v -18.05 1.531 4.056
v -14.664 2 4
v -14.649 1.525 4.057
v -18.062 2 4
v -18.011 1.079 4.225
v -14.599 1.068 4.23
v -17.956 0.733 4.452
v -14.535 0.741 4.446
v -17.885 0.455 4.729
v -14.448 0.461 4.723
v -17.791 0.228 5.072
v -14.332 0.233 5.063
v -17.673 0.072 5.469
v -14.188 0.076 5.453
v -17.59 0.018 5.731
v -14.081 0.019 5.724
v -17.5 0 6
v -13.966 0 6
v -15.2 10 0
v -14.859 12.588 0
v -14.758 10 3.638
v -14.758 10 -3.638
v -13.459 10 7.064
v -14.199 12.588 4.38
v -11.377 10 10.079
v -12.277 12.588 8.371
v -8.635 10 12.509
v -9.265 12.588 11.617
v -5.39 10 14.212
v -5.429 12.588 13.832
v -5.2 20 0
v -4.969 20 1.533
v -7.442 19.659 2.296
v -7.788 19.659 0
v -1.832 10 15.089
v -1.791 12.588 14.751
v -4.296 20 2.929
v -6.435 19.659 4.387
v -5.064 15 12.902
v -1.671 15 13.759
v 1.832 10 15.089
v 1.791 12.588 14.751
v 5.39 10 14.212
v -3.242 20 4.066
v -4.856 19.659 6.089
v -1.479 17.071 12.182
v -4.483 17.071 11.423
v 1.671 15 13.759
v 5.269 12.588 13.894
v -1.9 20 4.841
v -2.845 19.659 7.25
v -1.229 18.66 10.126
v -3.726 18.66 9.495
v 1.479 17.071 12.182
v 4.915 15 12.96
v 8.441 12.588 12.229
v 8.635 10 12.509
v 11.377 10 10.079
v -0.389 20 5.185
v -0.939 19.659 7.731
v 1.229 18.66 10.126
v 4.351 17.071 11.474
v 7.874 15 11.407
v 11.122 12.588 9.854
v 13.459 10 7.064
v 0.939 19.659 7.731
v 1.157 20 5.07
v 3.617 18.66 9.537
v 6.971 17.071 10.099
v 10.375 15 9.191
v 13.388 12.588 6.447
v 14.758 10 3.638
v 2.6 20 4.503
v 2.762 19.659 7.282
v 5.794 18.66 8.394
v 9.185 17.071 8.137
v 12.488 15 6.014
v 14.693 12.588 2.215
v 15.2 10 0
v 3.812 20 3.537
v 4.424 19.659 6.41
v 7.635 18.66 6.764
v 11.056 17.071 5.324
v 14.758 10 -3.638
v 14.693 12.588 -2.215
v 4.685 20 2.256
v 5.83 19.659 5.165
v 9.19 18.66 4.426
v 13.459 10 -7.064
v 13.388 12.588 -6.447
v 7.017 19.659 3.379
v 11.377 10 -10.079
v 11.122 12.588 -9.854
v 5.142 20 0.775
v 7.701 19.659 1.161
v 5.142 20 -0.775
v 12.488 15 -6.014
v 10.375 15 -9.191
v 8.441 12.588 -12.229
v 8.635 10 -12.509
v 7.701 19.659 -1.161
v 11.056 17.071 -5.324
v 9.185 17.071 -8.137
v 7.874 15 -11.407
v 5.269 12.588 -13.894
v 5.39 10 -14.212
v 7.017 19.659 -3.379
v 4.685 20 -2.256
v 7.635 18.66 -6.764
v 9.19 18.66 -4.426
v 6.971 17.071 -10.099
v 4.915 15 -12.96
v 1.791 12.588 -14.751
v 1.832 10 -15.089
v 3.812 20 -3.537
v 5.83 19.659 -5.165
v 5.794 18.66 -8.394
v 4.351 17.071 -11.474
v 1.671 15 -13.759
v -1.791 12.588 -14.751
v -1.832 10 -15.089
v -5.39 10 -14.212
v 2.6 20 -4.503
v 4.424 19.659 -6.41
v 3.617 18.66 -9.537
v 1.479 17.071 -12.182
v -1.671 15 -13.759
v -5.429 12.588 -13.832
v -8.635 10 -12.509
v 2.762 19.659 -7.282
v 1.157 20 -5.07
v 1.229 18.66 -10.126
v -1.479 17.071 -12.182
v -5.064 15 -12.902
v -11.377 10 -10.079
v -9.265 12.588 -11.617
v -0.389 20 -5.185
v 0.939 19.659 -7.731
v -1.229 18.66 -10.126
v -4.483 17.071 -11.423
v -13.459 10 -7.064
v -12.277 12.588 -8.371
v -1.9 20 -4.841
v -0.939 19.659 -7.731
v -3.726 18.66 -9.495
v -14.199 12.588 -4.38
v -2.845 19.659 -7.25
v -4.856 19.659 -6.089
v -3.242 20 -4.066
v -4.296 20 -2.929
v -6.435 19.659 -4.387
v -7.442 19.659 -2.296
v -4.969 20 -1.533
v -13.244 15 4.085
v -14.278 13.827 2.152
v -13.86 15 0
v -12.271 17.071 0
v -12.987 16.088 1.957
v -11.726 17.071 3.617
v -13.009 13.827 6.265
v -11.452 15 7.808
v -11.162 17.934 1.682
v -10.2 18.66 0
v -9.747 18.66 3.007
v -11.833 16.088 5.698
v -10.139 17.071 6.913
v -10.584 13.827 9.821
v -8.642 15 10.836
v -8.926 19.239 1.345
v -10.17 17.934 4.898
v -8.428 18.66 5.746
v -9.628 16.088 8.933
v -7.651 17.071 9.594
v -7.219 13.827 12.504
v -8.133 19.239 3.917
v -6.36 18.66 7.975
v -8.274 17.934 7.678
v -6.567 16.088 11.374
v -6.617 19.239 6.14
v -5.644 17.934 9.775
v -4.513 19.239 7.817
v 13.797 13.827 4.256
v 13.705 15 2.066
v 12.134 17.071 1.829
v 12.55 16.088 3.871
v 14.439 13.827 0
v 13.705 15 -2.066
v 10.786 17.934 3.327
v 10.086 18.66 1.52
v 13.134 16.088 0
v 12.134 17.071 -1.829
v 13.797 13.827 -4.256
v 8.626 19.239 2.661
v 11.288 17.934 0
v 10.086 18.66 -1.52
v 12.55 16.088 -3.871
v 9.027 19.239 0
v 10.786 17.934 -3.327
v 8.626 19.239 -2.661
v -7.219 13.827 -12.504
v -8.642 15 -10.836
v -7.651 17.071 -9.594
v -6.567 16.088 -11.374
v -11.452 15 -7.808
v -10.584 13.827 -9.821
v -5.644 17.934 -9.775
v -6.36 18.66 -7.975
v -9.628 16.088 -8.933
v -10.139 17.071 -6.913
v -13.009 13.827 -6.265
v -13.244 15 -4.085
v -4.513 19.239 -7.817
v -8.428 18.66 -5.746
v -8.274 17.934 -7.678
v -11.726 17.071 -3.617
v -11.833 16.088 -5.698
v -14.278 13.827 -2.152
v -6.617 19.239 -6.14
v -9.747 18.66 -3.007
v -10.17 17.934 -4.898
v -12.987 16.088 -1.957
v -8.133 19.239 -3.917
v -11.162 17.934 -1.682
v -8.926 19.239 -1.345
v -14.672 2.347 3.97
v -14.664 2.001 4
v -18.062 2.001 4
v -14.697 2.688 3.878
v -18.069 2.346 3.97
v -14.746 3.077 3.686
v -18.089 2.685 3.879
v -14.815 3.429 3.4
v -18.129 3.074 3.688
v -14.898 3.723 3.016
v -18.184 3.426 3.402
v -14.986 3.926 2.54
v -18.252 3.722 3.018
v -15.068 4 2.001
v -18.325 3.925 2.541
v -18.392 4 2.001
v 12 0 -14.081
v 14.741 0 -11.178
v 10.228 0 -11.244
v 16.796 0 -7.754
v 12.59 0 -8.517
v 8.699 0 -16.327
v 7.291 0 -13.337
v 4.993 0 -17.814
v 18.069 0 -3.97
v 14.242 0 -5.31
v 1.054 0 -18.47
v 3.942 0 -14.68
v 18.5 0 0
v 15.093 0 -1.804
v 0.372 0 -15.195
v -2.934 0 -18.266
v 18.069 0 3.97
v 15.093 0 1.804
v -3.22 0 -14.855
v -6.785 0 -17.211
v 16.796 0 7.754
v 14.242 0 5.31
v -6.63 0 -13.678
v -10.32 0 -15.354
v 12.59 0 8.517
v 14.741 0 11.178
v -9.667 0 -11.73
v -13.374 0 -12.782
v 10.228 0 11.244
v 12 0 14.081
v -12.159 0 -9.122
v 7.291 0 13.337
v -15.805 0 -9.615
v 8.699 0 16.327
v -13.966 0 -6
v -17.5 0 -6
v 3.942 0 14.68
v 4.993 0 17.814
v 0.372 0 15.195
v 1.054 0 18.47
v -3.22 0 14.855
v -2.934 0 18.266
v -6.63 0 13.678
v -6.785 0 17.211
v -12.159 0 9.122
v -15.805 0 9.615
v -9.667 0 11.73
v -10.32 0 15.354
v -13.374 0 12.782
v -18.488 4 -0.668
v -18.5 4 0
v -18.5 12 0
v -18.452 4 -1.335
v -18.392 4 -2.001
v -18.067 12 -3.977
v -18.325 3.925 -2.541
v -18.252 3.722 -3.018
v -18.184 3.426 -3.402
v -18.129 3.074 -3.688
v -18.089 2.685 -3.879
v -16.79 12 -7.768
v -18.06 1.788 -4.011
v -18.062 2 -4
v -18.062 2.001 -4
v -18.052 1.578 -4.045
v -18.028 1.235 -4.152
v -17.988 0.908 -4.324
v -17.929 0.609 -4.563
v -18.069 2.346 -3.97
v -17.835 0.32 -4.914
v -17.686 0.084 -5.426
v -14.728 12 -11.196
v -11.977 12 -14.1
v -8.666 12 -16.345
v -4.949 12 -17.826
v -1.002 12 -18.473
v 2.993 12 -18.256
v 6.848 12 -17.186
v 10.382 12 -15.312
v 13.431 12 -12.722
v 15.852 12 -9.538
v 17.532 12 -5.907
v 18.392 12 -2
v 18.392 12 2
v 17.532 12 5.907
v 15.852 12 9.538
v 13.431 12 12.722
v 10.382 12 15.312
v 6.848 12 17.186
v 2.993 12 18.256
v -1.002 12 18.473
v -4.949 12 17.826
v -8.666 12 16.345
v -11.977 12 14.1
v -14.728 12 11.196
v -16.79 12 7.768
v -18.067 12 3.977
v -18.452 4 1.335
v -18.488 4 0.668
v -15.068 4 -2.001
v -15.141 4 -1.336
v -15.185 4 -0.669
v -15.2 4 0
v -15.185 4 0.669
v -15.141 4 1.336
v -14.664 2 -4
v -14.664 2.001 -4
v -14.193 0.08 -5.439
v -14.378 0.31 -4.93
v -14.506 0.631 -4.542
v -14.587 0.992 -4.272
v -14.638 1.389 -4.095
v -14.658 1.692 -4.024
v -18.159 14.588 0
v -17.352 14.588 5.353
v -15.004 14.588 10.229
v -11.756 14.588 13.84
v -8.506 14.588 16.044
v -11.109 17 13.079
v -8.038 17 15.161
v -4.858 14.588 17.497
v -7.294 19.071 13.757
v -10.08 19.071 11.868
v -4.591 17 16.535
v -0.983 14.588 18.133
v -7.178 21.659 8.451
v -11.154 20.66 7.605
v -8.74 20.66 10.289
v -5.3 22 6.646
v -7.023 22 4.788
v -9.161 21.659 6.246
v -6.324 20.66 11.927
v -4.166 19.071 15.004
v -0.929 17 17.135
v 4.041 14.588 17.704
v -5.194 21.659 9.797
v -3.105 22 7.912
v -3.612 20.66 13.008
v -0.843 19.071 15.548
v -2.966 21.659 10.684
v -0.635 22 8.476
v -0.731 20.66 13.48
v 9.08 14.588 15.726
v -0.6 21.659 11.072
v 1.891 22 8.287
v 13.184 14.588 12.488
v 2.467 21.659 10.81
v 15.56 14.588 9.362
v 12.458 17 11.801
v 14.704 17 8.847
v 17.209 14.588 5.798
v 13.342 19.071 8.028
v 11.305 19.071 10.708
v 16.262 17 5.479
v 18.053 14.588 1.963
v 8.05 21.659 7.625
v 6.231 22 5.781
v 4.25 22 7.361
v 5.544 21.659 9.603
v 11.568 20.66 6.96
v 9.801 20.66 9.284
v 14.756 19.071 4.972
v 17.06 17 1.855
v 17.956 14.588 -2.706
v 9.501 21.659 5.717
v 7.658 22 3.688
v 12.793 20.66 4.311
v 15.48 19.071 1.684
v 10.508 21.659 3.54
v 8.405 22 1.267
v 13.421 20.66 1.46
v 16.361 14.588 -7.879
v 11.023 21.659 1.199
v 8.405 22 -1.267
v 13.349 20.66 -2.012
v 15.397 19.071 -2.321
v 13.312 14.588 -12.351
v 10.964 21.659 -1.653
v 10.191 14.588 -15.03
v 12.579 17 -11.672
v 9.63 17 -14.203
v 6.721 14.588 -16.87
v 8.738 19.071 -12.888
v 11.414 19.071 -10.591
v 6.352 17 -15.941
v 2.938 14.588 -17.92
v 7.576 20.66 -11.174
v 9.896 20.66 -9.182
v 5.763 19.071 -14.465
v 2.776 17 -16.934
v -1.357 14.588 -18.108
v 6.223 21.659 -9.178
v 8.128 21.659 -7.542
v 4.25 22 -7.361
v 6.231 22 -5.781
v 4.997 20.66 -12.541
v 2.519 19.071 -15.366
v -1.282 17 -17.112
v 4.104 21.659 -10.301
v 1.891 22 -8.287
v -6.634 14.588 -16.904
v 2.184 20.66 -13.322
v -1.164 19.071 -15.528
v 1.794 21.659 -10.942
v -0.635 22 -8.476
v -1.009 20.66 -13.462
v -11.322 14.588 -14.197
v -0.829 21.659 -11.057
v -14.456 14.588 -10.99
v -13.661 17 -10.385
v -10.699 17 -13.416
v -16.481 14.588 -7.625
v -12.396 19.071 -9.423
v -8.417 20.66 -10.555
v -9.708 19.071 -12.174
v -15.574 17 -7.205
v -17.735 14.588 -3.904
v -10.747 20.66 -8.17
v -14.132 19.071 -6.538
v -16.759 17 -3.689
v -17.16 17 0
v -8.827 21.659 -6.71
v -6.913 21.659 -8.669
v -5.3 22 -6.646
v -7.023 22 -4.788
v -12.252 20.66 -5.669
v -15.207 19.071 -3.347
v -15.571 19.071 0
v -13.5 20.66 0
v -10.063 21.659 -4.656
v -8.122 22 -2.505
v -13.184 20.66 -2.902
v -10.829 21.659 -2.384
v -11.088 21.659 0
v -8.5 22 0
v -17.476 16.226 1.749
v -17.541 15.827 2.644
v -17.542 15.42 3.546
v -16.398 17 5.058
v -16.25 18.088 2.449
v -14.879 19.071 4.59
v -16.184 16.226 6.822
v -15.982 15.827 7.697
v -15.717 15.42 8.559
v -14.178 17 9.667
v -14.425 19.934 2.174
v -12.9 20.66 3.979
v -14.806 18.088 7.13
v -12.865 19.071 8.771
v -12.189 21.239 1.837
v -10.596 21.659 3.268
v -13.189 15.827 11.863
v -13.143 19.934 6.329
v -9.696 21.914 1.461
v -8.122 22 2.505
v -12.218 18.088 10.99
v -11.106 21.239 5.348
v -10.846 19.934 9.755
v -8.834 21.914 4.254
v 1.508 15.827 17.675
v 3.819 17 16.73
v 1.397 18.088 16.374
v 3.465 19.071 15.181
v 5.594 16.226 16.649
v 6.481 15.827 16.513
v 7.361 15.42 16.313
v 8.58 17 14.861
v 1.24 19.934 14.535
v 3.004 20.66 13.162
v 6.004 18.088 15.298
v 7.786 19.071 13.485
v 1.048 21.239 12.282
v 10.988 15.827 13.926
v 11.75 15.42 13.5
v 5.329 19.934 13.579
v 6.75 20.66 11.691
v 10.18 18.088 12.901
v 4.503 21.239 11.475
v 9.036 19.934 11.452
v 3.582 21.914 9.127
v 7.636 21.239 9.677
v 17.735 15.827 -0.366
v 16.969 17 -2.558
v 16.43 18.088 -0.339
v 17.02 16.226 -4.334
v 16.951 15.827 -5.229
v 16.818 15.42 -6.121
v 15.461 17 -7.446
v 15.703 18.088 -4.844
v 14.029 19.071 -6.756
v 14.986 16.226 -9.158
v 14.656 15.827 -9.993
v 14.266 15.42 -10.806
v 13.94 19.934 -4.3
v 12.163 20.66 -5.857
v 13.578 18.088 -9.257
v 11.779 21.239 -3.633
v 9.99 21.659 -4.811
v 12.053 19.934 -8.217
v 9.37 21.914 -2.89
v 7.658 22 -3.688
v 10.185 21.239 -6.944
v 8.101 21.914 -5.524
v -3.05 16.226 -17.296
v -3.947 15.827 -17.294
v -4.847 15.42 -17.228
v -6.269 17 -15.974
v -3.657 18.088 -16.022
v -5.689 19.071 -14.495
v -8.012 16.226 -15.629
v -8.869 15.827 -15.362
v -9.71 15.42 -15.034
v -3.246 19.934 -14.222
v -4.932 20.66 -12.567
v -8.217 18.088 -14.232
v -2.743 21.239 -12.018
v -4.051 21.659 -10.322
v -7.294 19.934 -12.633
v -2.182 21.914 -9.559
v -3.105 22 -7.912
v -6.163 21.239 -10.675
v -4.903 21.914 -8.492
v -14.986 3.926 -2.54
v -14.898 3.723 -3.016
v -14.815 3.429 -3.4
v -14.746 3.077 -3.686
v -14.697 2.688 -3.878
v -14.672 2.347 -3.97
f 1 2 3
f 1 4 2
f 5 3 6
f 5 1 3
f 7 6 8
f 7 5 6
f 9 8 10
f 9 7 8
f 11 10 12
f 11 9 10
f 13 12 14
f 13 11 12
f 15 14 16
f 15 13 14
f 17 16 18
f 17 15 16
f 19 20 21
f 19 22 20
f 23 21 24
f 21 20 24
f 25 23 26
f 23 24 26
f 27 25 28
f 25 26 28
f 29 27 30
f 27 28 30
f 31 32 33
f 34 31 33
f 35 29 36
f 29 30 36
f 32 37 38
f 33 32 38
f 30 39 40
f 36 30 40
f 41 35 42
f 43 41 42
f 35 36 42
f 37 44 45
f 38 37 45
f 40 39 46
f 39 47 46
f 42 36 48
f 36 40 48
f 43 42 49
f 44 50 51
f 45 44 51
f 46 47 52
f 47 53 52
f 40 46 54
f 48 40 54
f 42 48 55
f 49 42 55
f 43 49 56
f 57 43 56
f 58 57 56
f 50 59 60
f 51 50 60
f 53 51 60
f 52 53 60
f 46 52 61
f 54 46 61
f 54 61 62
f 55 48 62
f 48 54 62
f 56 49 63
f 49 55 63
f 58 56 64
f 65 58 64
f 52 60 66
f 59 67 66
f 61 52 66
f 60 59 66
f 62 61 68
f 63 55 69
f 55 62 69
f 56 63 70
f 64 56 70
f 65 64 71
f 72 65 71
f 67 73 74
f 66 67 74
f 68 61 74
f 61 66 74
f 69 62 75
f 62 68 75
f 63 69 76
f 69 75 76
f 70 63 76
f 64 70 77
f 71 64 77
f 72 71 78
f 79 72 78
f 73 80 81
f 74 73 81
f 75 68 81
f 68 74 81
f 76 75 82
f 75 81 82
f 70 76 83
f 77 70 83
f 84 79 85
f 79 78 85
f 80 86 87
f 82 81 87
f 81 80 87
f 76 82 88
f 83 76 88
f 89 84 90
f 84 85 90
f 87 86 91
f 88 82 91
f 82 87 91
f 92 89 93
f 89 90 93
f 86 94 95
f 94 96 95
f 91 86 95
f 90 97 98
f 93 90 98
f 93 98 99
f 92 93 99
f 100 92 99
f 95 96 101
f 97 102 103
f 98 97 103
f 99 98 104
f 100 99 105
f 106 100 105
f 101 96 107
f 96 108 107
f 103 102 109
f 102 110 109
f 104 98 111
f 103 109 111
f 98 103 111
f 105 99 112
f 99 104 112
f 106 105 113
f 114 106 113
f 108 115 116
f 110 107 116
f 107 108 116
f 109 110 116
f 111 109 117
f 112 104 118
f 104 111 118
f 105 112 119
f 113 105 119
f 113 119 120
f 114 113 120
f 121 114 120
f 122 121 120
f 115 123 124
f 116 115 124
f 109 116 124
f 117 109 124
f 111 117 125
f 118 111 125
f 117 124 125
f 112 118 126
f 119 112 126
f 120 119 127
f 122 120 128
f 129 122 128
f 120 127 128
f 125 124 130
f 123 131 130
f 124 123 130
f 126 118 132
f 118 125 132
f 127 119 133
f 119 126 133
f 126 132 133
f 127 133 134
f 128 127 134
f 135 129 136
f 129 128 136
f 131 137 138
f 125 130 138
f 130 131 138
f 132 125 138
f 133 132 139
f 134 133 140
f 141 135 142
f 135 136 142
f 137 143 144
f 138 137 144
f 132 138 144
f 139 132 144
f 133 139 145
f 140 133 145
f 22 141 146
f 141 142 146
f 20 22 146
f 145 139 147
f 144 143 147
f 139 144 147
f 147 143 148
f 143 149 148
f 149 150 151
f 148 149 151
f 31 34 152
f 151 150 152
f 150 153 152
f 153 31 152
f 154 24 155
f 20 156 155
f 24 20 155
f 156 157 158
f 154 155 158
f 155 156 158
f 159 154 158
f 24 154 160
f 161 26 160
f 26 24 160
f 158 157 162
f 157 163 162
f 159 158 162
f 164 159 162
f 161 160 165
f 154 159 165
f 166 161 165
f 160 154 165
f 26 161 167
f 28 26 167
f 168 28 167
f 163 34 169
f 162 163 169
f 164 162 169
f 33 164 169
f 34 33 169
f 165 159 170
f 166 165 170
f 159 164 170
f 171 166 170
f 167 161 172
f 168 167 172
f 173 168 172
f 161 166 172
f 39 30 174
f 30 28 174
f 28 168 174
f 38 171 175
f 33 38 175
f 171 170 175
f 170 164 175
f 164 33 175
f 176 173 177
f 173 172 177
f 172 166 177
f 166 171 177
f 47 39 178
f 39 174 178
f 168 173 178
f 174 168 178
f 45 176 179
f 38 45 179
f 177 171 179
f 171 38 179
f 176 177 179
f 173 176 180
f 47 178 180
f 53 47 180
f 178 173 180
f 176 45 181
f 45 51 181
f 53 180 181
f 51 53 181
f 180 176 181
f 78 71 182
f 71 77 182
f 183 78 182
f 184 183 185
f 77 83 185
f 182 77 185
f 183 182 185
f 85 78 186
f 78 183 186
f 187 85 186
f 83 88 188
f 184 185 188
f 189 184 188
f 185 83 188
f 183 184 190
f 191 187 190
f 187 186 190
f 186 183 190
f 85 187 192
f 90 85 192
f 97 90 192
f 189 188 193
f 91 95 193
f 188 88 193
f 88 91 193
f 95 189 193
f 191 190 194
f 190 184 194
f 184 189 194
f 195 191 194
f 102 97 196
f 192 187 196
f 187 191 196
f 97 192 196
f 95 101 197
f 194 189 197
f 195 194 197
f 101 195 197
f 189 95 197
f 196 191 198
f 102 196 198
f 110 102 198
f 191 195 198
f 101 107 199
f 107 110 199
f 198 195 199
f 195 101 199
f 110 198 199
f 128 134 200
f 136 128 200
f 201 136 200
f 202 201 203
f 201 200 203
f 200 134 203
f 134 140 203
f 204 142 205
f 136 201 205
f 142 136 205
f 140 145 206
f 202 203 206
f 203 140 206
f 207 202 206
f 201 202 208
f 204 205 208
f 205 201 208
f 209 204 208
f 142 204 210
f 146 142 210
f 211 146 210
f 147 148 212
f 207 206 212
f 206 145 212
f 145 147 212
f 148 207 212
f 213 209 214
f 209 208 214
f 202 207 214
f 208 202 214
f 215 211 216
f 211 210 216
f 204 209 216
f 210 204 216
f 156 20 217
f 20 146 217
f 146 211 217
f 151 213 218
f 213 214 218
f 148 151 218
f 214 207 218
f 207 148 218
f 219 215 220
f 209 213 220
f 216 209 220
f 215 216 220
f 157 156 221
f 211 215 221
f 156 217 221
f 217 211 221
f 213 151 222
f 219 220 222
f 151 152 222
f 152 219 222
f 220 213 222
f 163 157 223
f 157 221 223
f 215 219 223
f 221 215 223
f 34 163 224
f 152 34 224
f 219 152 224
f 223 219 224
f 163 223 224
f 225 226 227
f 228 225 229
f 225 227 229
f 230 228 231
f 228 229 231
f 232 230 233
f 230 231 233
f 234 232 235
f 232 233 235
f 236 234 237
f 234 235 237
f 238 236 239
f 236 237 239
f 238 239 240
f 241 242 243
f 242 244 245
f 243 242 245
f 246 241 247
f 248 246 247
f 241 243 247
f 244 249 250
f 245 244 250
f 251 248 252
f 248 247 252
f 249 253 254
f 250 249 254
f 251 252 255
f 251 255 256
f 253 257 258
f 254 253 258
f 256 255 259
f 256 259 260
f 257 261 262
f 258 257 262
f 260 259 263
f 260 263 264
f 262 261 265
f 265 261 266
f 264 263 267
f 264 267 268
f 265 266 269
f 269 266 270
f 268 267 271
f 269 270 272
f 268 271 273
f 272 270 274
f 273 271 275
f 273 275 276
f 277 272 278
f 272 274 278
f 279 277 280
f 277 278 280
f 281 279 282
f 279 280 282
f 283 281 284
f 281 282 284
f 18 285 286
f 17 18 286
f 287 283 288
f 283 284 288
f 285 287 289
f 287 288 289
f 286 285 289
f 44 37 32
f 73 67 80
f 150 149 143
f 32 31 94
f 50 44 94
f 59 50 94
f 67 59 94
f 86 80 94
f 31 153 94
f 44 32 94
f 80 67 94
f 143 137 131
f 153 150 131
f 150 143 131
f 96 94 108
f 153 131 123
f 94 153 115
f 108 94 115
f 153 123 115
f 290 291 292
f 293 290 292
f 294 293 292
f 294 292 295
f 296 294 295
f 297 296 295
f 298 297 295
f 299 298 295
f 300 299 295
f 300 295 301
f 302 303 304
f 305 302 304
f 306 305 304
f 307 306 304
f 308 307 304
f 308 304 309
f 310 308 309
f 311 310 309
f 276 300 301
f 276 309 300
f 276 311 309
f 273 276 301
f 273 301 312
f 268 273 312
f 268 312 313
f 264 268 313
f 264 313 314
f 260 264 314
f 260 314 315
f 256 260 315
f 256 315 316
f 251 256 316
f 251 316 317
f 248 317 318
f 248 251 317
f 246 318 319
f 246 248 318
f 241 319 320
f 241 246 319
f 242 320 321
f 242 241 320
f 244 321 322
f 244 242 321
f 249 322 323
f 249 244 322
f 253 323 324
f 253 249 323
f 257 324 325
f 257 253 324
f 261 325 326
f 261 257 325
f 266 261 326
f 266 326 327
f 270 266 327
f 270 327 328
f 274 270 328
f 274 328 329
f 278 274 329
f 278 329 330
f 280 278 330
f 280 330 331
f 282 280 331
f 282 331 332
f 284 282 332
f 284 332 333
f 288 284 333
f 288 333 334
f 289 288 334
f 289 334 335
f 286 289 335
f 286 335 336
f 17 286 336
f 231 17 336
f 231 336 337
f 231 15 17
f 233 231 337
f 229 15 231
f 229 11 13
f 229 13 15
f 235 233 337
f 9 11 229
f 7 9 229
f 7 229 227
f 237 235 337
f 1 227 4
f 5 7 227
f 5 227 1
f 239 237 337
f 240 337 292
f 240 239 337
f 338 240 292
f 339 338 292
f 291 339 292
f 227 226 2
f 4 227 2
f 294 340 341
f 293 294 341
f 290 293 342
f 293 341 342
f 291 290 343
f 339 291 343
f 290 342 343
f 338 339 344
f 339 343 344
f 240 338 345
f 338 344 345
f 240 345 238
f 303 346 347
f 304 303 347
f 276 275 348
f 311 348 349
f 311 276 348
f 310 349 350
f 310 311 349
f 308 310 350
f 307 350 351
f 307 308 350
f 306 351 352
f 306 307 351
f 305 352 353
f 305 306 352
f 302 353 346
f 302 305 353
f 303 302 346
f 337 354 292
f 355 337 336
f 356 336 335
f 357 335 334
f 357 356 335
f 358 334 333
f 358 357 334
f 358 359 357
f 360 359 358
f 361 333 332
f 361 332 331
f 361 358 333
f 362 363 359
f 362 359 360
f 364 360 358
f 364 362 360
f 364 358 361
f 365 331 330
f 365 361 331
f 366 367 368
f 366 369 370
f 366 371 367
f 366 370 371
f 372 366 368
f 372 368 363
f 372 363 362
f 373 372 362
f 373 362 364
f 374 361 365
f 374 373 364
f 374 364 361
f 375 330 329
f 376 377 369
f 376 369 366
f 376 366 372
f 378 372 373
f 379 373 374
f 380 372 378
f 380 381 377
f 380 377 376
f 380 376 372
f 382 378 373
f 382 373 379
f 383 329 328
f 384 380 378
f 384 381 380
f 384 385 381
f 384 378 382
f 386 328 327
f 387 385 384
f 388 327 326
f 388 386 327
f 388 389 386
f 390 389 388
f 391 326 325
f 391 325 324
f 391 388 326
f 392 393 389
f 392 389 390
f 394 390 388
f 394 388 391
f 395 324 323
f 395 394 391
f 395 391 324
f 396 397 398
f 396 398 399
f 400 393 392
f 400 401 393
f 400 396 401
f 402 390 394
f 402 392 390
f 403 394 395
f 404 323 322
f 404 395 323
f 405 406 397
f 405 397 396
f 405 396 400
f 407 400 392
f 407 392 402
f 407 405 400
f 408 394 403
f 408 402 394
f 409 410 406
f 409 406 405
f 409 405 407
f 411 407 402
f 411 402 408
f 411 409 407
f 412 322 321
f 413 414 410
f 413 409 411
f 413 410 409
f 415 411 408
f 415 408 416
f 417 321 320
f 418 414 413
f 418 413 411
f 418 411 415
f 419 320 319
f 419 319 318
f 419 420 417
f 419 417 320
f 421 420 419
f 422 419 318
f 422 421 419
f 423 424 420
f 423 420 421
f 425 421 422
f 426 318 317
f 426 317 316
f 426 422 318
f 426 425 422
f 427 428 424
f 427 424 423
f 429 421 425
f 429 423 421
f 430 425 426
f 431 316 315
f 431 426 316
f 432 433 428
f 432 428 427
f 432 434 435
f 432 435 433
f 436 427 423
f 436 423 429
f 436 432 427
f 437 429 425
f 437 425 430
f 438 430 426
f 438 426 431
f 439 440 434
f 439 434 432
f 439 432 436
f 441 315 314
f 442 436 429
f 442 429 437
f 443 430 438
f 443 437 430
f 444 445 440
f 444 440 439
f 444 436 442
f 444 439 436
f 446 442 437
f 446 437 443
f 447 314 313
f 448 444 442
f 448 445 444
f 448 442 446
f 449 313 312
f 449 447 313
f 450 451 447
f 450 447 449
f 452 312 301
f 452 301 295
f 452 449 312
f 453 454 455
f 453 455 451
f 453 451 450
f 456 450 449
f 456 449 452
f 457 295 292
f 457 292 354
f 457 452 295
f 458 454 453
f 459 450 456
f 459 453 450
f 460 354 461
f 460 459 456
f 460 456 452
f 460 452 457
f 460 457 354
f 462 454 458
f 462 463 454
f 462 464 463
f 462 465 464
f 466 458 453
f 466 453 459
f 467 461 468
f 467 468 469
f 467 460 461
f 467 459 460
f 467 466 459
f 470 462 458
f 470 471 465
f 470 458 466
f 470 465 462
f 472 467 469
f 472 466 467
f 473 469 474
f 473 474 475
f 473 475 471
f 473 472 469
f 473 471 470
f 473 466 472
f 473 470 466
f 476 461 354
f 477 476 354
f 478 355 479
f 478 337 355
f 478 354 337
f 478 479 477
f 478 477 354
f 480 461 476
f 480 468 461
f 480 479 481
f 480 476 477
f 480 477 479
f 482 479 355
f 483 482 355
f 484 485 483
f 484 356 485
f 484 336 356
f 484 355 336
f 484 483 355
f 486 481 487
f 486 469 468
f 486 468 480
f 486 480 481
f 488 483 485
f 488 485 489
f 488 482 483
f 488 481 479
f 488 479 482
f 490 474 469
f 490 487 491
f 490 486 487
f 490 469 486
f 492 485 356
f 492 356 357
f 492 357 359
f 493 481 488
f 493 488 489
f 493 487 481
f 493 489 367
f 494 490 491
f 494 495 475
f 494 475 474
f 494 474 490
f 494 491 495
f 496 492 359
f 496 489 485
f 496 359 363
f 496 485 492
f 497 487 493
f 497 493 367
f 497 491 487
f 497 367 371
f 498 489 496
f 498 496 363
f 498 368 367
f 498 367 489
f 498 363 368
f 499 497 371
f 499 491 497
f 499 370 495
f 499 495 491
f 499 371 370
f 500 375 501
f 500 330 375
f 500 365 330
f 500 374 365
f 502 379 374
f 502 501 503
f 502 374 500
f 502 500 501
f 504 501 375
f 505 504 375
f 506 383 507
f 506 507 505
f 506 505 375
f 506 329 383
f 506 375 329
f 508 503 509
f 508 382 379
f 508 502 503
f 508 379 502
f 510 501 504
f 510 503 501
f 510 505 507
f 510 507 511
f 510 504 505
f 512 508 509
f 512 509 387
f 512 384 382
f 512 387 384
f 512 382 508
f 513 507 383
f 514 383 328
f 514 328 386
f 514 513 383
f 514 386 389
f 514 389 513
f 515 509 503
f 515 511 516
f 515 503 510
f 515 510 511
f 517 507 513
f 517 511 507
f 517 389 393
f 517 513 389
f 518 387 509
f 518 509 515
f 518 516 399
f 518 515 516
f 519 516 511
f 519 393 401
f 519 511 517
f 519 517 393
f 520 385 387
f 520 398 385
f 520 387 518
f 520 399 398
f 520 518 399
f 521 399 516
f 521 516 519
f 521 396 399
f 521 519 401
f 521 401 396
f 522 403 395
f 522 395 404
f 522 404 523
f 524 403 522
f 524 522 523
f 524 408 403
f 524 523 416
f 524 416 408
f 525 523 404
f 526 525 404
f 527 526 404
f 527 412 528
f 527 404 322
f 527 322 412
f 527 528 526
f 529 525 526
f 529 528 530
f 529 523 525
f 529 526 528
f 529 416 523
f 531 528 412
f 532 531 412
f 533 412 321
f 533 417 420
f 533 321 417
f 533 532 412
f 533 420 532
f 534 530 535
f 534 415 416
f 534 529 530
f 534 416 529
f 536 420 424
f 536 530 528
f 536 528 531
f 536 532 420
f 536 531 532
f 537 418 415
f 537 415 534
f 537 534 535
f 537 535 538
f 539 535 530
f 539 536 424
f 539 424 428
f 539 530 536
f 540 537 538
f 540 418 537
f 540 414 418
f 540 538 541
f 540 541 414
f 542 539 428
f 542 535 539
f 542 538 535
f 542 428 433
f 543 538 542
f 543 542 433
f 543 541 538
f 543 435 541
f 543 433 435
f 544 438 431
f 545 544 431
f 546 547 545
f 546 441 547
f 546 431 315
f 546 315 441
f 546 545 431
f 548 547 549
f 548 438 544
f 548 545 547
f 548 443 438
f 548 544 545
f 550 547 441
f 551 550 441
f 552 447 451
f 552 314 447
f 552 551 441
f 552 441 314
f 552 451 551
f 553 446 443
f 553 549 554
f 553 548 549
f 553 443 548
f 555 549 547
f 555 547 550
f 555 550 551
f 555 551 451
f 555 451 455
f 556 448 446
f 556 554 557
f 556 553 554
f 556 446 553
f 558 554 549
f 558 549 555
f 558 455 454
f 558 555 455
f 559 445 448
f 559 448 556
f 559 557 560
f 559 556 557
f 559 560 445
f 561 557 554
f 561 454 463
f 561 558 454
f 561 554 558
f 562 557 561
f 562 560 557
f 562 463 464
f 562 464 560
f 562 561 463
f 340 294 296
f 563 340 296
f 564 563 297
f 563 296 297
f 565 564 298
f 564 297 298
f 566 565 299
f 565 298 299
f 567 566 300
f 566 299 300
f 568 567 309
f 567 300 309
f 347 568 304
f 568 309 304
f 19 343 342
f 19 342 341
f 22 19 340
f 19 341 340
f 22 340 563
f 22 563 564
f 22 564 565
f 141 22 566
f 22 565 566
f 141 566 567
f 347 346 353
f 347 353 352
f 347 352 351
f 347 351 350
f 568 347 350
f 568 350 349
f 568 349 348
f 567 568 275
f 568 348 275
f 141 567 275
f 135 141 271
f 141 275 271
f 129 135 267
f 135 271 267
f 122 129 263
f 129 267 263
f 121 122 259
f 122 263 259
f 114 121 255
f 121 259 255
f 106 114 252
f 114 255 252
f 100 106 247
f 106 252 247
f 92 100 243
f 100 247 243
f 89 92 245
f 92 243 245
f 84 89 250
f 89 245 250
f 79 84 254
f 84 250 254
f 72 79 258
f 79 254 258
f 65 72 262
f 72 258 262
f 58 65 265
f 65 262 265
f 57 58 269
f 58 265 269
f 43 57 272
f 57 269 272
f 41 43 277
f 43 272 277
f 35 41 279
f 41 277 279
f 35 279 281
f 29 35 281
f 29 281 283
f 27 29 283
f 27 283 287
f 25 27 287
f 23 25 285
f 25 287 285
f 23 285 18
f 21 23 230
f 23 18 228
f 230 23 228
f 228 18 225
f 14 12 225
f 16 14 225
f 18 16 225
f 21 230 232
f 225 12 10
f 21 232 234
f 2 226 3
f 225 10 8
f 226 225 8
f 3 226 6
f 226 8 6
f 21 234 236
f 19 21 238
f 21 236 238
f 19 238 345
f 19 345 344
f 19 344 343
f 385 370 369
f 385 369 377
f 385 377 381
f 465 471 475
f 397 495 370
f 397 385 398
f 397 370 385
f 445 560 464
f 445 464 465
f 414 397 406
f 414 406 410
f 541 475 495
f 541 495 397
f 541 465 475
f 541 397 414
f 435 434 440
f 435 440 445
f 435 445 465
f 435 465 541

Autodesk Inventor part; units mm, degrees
ref_plane "YZ Plane" through (0, 0, 0) normal (1, 0, 0) x (0, 1, 0)
ref_plane "XZ Plane" through (0, 0, 0) normal (0, 1, 0) x (-1, 0, 0)
ref_plane "XY Plane" through (0, 0, 0) normal (0, 0, 1) x (1, 0, 0)
sketch "스케치1" plane through (0, 0, 0) normal (0, 1, 0) x (-1, 0, 0)
  circle A0 centre (0, 0) radius 15.2
  circle A1 centre (0, 0) radius 18.5
  dimension "d0" = 30.4
  dimension "d1" = 37
extrude "돌출1" add sketch "스케치1" along normal blind 20
sketch "스케치2" plane through (0, 20, 0) normal (0, 1, 0) x (1, 0, 0)
  circle A0 centre (0, 0) radius 18.5 projected
  circle A1 centre (0, 0) radius 15.2 projected
extrude "돌출2" add sketch "스케치2" along normal blind 2 contours A0 | A1
fillet "모깎기1" radius 10 2 edges at (15.2, 20, 0) (-18.5, 22, 0)
sketch "스케치3" plane through (0, 0, 0) normal (1, 0, 0) x (0, 1, 0)
  line L0 (0, -18.5) -> (0, 18.5) projected
  line L1 (4, 4) -> (0, 4)
  line L2 (0, 4) -> (0, -4)
  line L3 (0, -4) -> (4, -4)
  line L4 (4, -4) -> (4, 4)
  point P0 (0, 0)
  point P1 (0, 0)
  point P2 (0, 4)
  dimension "d7" = 4
  dimension "d8" = 8
extrude "돌출3" cut sketch "스케치3" against normal through all
fillet "모깎기2" radius 2 4 edges at (-16.3633, 0, 4) (-16.3633, 4, -4) (-16.3633, 0, -4) (-16.3633, 4, 4)
properties part number "arm 2 cover_1"
